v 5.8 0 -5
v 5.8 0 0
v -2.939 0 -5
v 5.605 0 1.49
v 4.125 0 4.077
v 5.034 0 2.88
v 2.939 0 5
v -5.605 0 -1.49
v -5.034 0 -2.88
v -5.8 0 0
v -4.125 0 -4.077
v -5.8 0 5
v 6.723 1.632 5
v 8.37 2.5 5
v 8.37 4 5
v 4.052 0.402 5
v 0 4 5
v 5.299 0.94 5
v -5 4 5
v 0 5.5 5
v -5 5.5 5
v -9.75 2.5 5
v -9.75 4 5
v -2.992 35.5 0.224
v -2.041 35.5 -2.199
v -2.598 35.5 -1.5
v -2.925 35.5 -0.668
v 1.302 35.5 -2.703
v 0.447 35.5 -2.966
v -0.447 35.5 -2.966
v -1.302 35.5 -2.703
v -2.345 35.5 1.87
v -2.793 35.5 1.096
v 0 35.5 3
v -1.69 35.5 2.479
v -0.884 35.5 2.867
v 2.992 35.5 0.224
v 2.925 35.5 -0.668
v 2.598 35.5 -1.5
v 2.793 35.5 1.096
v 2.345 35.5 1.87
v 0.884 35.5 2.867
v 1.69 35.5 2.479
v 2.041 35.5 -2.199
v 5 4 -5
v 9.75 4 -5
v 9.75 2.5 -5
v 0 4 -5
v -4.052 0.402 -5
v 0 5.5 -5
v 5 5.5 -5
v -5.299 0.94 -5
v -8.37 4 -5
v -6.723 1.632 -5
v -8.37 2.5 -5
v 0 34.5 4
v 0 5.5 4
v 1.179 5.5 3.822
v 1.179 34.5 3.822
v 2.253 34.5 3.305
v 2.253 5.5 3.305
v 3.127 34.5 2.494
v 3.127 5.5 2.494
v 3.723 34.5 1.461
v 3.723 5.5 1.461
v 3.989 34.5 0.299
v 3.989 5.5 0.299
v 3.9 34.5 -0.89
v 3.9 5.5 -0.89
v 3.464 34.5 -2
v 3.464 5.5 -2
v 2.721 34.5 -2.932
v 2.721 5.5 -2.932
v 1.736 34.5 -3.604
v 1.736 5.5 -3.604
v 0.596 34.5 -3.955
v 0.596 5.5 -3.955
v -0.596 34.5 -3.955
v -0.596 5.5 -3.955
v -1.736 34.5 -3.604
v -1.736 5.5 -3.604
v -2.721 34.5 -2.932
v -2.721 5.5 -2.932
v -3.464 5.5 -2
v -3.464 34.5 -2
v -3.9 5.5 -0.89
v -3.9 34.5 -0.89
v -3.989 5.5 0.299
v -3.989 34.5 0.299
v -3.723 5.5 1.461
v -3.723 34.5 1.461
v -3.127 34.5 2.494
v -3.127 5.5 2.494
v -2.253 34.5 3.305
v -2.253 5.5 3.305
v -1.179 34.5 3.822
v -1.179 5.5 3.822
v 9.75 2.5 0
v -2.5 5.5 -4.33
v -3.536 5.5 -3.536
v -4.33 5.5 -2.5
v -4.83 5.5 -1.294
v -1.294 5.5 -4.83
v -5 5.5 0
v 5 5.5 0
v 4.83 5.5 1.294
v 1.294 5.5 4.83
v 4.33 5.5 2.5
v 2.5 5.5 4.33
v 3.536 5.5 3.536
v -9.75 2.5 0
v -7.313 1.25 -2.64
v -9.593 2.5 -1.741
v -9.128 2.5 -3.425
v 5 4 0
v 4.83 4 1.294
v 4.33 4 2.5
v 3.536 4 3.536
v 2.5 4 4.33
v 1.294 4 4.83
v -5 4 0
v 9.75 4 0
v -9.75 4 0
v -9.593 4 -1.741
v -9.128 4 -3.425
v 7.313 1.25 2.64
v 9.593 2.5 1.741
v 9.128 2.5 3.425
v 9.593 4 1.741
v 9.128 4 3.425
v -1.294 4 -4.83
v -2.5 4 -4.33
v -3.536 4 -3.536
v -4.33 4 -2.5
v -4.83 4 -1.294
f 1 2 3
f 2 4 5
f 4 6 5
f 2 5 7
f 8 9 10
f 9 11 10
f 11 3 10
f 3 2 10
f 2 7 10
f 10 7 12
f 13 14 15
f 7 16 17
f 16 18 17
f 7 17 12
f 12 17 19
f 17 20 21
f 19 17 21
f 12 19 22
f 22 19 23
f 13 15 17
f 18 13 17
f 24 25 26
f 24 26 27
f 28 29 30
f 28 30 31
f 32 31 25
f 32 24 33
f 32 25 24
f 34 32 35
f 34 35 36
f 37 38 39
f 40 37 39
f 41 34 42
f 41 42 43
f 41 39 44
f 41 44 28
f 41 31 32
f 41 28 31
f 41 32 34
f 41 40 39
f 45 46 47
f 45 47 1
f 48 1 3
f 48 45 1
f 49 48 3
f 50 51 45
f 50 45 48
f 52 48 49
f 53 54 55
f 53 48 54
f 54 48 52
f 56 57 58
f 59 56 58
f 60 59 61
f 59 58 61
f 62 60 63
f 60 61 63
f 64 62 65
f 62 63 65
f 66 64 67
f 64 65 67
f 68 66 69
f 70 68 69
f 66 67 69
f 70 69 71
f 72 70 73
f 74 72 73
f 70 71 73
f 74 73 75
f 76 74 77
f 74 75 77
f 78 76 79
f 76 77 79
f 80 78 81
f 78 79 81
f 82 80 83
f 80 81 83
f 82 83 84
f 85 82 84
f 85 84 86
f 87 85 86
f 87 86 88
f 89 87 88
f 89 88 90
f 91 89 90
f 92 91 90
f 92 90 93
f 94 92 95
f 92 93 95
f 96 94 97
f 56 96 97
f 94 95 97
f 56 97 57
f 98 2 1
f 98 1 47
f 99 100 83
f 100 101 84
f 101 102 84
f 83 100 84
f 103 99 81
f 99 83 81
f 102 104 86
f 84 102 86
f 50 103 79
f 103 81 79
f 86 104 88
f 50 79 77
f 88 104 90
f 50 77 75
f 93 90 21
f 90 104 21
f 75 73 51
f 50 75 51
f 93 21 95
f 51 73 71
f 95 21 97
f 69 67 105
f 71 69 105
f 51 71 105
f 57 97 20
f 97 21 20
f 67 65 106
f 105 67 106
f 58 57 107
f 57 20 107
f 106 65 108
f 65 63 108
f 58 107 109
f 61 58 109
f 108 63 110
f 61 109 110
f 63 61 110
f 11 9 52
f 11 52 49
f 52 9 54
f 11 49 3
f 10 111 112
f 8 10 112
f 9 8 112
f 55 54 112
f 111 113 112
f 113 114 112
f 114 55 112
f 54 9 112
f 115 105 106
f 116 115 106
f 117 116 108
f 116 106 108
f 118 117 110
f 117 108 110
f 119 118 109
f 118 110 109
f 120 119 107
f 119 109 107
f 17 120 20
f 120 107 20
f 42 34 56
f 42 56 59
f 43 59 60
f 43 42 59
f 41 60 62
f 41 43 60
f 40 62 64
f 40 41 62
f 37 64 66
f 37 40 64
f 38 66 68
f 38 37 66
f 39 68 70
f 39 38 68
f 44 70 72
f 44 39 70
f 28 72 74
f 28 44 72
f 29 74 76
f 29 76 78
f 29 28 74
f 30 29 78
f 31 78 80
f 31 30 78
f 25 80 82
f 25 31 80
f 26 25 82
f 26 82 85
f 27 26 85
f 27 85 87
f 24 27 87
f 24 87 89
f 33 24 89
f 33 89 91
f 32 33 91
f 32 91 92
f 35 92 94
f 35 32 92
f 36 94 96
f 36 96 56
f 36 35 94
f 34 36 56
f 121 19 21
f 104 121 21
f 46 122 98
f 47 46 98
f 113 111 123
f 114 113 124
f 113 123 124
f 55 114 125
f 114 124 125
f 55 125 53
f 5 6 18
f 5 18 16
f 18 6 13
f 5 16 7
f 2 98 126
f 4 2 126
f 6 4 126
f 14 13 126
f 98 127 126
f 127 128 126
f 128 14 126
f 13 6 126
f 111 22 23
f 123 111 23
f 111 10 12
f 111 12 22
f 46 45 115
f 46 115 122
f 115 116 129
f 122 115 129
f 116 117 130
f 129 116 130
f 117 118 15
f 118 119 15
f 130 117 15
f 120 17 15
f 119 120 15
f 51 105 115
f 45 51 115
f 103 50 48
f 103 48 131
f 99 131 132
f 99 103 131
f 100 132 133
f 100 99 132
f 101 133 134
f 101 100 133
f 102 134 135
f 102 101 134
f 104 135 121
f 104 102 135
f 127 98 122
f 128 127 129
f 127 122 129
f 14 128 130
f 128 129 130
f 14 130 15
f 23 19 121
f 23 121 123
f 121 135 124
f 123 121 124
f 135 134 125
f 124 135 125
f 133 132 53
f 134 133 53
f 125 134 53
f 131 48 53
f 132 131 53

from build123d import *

# Parameters (mm, degrees)
EXTRUDE_1_DEPTH     = 5
CUT_EXTRUDE_1_DEPTH = 1.5
SKETCH_2_R          = 4
EXTRUDE_2_DEPTH     = 30
CUT_EXTRUDE_2_DEPTH = 5
CHAMFER_2_SIZE      = 1


with BuildPart() as part:
    # Эскиз1 → Бобышка-Вытянуть1 (new body, symmetric)
    with BuildSketch(Plane.XY):
        Polygon((9.75, 0), (-9.75, 0), (-9.75, 4), (-5, 4), (-5, 5.5), (5, 5.5), (5, 4), (9.75, 4), align=None)
    extrude(amount=EXTRUDE_1_DEPTH, both=True)

    # Эскиз3 → Вырез-Вытянуть1 (cut)
    with BuildSketch(Plane(origin=(0, 5.5, 0), x_dir=(1, 0, 0), z_dir=(0, 1, 0))):
        with BuildLine():
            Line((-5, 0), (-5, 5))
            Line((-5, 5), (0, 5))
            ThreePointArc((0, 5), (-3.535533906, 3.535533906), (-5, 0))
        make_face()
        with BuildLine():
            Line((0, -5), (5, -5))
            Line((5, -5), (5, 0))
            ThreePointArc((5, 0), (3.535533906, -3.535533906), (0, -5))
        make_face()
    extrude(amount=-CUT_EXTRUDE_1_DEPTH, mode=Mode.SUBTRACT)

    # Эскиз2 → Бобышка-Вытянуть2 (add)
    with BuildSketch(Plane(origin=(0, 5.5, 0), x_dir=(1, 0, 0), z_dir=(0, 1, 0))):
        with Locations(Location((0, 0, 0), (0, 0, 270))):  # turned: the seam where the file's is
            Circle(SKETCH_2_R)
    extrude(amount=EXTRUDE_2_DEPTH)

    # Эскиз4 → Вырез-Вытянуть2 (cut, through all)
    with BuildSketch(Plane(origin=(0, 4, 0), x_dir=(1, 0, 0), z_dir=(0, 1, 0))):
        with BuildLine():
            Line((-8.370334521, 5), (-9.75, 5))
            Line((-9.75, 5), (-9.75, 0))
            ThreePointArc((-9.75, 0), (-9.398756875, 2.59342808), (-8.370334521, 5))
        make_face()
        with BuildLine():
            Line((8.370334521, -5), (9.75, -5))
            Line((9.75, -5), (9.75, 0))
            ThreePointArc((9.75, 0), (9.398756875, -2.59342808), (8.370334521, -5))
        make_face()
    extrude(amount=-CUT_EXTRUDE_2_DEPTH, mode=Mode.SUBTRACT)

    # Вырез-По траектории1: sweep along a path in Эскиз6
    with BuildLine(Plane.XZ) as sweep_1_path:
        Line((0, -9.75), (9.75, -9.75))
        Line((9.75, -9.75), (9.75, 0))
        ThreePointArc((9.75, 0), (6.894291117, 6.894291117), (0, 9.75))
        Line((0, 9.75), (-9.75, 9.75))
        Line((-9.75, 9.75), (-9.75, 0))
        ThreePointArc((-9.75, 0), (-6.894291117, -6.894291117), (0, -9.75))
    # Эскиз5 → Вырез-По траектории1 (sweep, cut)
    with BuildSketch(Plane.XY.offset(5)):
        Polygon((-9.75, 2.5), (-5.8, 0), (-9.75, 0), align=None)
    sweep(path=sweep_1_path.line, transition=Transition.RIGHT, mode=Mode.SUBTRACT)

    # Фаска2
    chamfer_2_edges = [part.edges().sort_by_distance(p)[0] for p in [
        (0, 35.5, -4),
    ]]
    chamfer(chamfer_2_edges, length=CHAMFER_2_SIZE)


solid = part.part
